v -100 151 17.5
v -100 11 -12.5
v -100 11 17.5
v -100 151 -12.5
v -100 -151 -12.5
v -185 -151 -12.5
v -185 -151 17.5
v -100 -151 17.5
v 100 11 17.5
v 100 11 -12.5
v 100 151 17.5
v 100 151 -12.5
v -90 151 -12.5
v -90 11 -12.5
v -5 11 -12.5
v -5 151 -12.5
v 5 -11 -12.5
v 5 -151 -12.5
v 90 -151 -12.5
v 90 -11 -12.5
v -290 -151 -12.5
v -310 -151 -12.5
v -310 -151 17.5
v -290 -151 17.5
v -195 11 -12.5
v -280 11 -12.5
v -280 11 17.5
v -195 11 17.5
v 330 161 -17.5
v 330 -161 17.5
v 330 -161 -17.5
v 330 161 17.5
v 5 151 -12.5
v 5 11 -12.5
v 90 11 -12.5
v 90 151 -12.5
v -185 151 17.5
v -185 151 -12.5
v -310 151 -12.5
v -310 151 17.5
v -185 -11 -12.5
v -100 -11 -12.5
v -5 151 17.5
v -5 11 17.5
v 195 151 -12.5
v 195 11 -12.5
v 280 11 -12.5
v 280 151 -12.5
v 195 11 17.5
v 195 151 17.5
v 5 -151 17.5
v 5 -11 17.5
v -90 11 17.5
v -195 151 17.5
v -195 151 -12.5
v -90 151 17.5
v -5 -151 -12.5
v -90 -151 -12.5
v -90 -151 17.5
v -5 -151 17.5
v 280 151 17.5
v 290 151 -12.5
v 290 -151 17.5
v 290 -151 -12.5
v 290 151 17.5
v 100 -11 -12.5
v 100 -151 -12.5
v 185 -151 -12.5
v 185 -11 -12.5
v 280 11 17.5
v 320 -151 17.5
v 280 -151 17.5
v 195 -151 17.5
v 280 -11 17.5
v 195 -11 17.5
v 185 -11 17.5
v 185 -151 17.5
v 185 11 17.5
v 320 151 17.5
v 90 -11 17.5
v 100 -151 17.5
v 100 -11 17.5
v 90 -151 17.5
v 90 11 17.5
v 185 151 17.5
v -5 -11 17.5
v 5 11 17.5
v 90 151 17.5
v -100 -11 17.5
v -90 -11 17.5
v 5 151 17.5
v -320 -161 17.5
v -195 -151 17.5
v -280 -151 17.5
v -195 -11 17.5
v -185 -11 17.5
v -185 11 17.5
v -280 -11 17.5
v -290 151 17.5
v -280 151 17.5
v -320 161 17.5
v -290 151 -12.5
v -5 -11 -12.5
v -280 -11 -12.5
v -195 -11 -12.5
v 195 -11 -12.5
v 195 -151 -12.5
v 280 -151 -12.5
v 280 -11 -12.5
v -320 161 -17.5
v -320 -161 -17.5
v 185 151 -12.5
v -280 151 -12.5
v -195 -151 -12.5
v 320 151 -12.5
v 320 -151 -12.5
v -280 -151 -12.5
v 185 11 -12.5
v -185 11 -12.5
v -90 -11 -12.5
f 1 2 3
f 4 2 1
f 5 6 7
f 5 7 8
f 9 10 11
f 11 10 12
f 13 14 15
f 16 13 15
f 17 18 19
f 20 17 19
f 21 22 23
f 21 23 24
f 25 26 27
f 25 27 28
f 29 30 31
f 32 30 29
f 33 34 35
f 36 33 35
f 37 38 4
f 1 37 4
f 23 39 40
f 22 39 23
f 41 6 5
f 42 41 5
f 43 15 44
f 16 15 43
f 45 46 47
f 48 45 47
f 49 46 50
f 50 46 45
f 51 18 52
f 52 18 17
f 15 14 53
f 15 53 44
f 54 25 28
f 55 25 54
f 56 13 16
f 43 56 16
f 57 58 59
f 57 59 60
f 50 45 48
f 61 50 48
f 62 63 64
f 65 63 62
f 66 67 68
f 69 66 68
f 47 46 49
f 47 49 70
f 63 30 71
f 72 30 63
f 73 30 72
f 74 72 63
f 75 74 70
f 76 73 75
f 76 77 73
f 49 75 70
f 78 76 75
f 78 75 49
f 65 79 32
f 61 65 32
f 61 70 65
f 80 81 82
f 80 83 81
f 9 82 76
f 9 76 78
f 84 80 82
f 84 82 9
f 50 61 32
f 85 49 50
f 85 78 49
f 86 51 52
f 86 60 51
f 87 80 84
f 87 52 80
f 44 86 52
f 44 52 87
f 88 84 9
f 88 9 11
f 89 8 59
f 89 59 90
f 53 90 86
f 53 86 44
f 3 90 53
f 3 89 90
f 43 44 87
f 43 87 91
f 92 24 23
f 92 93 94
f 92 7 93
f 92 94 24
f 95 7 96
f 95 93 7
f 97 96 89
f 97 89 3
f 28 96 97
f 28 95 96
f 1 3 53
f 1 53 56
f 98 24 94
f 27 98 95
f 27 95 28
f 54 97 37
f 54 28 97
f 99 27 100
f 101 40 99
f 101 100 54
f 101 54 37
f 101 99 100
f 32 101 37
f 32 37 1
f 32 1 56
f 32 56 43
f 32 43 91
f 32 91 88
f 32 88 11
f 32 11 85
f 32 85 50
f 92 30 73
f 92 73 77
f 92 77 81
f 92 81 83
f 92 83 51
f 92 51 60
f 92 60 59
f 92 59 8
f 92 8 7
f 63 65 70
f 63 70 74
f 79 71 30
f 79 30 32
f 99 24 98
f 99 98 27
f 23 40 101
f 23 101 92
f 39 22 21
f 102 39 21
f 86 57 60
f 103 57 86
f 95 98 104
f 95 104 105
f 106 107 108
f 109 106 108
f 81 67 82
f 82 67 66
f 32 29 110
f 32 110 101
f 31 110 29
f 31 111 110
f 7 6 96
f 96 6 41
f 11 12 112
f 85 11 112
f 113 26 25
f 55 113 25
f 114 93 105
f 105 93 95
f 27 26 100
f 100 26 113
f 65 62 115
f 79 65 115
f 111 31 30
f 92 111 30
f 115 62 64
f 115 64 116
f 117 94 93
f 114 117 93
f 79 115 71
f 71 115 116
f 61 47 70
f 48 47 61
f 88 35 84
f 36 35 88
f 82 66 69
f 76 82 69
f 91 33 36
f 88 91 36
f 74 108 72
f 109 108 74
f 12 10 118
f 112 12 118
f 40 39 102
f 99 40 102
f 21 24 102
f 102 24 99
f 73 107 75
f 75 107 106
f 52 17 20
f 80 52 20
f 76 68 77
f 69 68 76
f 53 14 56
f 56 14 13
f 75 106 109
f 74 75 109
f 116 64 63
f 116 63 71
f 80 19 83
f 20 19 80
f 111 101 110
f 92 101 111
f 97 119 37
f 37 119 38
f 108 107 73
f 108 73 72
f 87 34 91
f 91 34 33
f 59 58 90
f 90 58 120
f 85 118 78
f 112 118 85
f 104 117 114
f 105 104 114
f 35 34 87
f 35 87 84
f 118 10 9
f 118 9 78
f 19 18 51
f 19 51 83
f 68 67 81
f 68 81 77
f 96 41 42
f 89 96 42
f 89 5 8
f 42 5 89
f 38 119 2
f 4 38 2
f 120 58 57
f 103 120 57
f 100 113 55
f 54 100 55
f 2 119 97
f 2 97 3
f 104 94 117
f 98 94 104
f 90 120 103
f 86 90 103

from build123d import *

# Parameters (mm, degrees)
F0_W      = 580
F0_H      = 322
F1_DEPTH  = 17.5
F2_W      = 85
F2_H      = 140
F3_DEPTH  = 25
F4_W      = 322
F4_H      = 35
F5_DEPTH  = 30
F6_W      = 20
F6_H      = 302
F7_DEPTH  = 35.001
F8_W      = 322
F8_H      = 35
F9_DEPTH  = 40
F10_W     = 30
F10_H     = 302
F11_DEPTH = 35.001
F13_W     = 630
F13_H     = 302
F14_DEPTH = 5


with BuildPart() as f1:
    # F0 (on Top) → F1 (new body, symmetric)
    with BuildSketch(Plane.XY):
        Rectangle(F0_W, F0_H)
    extrude(amount=F1_DEPTH, both=True)

    # F2 (on Top) → F3 (cut, symmetric)
    with BuildSketch(Plane.XY):
        with Locations((237.5, -81)):
            Rectangle(F2_W, F2_H)
        with Locations((142.5, -81)):
            Rectangle(F2_W, F2_H)
        with Locations((47.5, -81)):
            Rectangle(F2_W, F2_H)
        with Locations((-47.5, -81)):
            Rectangle(F2_W, F2_H)
        with Locations((-142.5, -81)):
            Rectangle(F2_W, F2_H)
        with Locations((142.5, 81)):
            Rectangle(F2_W, F2_H)
        with Locations((237.5, 81)):
            Rectangle(F2_W, F2_H)
        with Locations((47.5, 81)):
            Rectangle(F2_W, F2_H)
        with Locations((-142.5, 81)):
            Rectangle(F2_W, F2_H)
        with Locations((-47.5, 81)):
            Rectangle(F2_W, F2_H)
        with Locations((-237.5, 81)):
            Rectangle(F2_W, F2_H)
        with Locations((-237.5, -81)):
            Rectangle(F2_W, F2_H)
    extrude(amount=F3_DEPTH, both=True, mode=Mode.SUBTRACT)


with BuildPart() as f5:
    # F4 (on face) → F5 (new body)
    with BuildSketch(Plane(origin=(-290, 0, 0), x_dir=(0, -1, 0), z_dir=(-1, 0, 0))):
        Rectangle(F4_W, F4_H)
    extrude(amount=F5_DEPTH)

    # F6 (on face) → F7 (cut, through all)
    with BuildSketch(Plane(origin=(0, 0, -17.5), x_dir=(1, 0, 0), z_dir=(0, 0, -1))):
        with Locations((-300, 0)):
            Rectangle(F6_W, F6_H)
    extrude(amount=-F7_DEPTH, mode=Mode.SUBTRACT)


with BuildPart() as f9:
    # F8 (on face) → F9 (new body)
    with BuildSketch(Plane.YZ.offset(290)):
        Rectangle(F8_W, F8_H)
    extrude(amount=F9_DEPTH)

    # F10 (on face) → F11 (cut, through all)
    with BuildSketch(Plane(origin=(0, 0, -17.5), x_dir=(1, 0, 0), z_dir=(0, 0, -1))):
        with Locations((305, 0)):
            Rectangle(F10_W, F10_H)
    extrude(amount=-F11_DEPTH, mode=Mode.SUBTRACT)


with BuildPart() as f5_1:
    add(f5.part)

    # F12: union F1, F9
    add(f1.part)
    add(f9.part)

    # F13 (on face) → F14 (join)
    with BuildSketch(Plane(origin=(0, 0, -17.5), x_dir=(1, 0, 0), z_dir=(0, 0, -1))):
        with Locations((5, 0)):
            Rectangle(F13_W, F13_H)
    extrude(amount=-F14_DEPTH)


solid = f5_1.part
